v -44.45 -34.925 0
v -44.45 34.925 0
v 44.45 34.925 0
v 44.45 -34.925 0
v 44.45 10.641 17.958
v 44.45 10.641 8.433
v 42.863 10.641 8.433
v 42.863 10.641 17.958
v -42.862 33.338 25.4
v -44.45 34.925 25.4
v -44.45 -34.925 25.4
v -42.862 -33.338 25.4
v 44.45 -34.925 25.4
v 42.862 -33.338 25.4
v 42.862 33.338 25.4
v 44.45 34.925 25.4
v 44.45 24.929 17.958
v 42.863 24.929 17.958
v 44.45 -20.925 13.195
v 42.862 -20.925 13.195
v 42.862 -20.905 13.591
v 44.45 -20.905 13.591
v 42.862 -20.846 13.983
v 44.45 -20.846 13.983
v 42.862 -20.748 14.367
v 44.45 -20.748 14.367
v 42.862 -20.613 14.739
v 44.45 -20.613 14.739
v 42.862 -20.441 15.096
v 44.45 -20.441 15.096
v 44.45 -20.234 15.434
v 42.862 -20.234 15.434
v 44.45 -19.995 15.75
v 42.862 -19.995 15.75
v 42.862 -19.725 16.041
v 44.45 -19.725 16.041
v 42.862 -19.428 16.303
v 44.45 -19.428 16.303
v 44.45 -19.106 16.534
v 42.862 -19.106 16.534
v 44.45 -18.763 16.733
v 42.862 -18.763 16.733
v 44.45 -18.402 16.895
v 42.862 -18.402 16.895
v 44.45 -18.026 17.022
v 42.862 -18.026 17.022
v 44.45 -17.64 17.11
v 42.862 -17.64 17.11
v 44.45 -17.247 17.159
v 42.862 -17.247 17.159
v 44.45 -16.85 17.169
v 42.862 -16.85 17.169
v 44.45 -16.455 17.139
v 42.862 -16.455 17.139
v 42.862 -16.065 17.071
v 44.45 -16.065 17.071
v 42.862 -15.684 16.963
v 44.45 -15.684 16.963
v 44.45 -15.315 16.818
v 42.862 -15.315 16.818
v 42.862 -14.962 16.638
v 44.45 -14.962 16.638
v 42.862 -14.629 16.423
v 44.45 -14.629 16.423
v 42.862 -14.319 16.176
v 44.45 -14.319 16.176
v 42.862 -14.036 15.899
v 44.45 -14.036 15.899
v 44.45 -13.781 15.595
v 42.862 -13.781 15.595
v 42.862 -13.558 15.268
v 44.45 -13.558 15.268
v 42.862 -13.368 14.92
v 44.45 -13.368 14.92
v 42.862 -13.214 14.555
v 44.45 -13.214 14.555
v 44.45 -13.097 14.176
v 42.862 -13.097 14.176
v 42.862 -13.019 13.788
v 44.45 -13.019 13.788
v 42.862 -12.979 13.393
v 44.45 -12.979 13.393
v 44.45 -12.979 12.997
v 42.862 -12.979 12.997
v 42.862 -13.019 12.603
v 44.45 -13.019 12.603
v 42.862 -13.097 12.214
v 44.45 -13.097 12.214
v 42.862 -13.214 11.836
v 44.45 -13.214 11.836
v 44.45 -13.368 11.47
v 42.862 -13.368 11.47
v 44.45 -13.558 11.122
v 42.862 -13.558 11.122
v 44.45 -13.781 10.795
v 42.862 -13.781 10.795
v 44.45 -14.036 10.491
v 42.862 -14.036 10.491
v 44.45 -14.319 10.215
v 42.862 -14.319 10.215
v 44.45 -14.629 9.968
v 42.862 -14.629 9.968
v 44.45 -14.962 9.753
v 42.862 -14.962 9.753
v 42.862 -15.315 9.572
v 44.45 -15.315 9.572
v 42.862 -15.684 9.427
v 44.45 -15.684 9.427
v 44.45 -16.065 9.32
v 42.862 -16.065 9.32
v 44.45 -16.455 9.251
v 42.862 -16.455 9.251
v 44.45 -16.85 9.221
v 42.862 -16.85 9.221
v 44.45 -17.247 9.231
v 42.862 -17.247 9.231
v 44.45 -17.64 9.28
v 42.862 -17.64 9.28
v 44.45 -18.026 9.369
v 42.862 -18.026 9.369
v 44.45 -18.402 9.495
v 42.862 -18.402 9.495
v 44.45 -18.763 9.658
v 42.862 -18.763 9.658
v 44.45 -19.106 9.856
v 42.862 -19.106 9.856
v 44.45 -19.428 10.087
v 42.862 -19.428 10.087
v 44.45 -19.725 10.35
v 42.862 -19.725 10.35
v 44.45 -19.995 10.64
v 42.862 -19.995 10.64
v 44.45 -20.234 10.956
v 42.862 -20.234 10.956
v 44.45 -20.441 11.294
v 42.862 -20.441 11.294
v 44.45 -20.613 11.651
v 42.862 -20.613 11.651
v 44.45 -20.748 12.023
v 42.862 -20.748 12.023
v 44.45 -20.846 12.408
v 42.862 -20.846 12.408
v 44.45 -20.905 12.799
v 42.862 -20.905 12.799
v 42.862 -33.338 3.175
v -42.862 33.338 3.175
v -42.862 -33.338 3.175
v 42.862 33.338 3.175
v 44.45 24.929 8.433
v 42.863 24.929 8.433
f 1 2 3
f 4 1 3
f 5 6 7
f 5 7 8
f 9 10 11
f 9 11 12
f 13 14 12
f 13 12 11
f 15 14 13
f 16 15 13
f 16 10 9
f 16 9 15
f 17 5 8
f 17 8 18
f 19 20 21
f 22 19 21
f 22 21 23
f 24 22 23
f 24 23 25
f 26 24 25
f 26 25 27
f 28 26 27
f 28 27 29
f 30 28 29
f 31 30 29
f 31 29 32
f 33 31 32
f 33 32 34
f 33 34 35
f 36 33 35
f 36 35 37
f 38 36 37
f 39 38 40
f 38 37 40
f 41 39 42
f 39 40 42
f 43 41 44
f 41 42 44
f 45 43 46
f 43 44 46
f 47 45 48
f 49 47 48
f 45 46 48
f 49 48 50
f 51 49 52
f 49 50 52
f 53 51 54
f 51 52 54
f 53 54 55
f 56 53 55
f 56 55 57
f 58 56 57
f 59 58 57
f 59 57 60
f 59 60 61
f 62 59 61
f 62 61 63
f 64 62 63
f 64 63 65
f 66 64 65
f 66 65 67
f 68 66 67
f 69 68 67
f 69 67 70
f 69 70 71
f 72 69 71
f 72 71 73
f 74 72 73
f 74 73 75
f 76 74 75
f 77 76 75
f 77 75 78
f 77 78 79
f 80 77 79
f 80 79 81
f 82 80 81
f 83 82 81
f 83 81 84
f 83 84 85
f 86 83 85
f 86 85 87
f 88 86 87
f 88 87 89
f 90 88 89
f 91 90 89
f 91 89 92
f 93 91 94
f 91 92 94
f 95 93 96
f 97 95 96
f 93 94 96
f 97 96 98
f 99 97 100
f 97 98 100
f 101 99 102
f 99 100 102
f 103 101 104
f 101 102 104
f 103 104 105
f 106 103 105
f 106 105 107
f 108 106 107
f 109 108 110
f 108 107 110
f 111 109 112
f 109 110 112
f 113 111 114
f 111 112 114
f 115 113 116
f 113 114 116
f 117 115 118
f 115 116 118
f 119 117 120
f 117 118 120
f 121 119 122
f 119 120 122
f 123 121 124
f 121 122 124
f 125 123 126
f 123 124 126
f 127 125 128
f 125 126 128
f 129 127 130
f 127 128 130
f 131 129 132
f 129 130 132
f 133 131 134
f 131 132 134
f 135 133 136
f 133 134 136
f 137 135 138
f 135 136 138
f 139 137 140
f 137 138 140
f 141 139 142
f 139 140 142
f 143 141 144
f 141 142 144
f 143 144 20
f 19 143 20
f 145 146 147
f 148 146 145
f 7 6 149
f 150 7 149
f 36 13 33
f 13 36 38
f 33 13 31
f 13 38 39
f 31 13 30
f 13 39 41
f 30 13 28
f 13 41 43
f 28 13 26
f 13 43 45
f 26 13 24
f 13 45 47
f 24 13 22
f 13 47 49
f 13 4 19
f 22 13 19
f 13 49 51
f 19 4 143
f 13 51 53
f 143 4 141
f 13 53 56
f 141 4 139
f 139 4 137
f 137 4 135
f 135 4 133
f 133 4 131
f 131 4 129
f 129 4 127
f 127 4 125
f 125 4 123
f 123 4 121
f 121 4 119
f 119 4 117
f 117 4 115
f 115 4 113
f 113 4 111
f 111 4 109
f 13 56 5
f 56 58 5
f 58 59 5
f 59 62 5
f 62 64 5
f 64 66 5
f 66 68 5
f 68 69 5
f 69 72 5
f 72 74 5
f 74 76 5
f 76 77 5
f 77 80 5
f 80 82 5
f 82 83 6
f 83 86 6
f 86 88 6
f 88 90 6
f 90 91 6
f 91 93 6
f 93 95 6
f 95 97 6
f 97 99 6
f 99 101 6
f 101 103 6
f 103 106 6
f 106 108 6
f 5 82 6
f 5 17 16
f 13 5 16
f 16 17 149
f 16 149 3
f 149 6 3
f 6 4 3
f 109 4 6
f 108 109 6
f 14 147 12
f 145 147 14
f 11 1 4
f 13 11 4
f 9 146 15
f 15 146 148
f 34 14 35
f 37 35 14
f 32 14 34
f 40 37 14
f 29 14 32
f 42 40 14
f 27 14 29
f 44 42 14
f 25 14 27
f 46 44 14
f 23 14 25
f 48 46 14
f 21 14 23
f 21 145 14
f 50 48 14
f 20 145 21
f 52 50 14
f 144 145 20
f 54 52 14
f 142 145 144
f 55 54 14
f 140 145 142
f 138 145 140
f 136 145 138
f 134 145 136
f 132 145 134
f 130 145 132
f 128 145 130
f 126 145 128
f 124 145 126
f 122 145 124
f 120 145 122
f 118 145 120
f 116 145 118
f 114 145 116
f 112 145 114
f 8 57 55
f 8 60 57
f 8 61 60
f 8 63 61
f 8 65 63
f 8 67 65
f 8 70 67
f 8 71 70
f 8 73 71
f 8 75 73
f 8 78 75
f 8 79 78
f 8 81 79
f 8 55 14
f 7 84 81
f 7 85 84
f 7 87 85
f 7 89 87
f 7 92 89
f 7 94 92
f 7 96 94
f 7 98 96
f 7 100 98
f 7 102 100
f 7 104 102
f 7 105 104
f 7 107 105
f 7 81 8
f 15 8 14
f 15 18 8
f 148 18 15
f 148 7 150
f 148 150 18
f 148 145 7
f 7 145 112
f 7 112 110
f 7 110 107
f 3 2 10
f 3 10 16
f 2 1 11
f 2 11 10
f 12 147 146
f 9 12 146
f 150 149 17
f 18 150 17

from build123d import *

# Parameters (mm, degrees)
F0_W     = 88.9
F0_H     = 69.85
F0_W_2   = 85.725
F0_H_2   = 66.675
F1_DEPTH = 25.4
F2_DEPTH = 3.175
F4_D     = 7.9502
F4_DEPTH = 12.7
F3_W     = 14.2875
F3_H     = 9.525
F5_DEPTH = 1.5875


with BuildPart() as f1:
    # F0 (on Top) → F1 (new body)
    with BuildSketch(Plane.XY):
        Rectangle(F0_W, F0_H)
        Rectangle(F0_W_2, F0_H_2, mode=Mode.SUBTRACT)
    extrude(amount=F1_DEPTH)

    # F0 (on Top) → F2 (join)
    with BuildSketch(Plane.XY):
        Rectangle(F0_W_2, F0_H_2)
    extrude(amount=F2_DEPTH)

    # F4
    with Locations(Plane.YZ.offset(44.45)):
        with Locations((-16.949601, 13.195173)):
            Hole(F4_D / 2, depth=F4_DEPTH)

    # F3 (on face) → F5 (cut, through all)
    with BuildSketch(Plane.YZ.offset(44.45)):
        with Locations((17.784979, 13.195173)):
            Rectangle(F3_W, F3_H)
    extrude(amount=-F5_DEPTH, mode=Mode.SUBTRACT)


solid = f1.part
